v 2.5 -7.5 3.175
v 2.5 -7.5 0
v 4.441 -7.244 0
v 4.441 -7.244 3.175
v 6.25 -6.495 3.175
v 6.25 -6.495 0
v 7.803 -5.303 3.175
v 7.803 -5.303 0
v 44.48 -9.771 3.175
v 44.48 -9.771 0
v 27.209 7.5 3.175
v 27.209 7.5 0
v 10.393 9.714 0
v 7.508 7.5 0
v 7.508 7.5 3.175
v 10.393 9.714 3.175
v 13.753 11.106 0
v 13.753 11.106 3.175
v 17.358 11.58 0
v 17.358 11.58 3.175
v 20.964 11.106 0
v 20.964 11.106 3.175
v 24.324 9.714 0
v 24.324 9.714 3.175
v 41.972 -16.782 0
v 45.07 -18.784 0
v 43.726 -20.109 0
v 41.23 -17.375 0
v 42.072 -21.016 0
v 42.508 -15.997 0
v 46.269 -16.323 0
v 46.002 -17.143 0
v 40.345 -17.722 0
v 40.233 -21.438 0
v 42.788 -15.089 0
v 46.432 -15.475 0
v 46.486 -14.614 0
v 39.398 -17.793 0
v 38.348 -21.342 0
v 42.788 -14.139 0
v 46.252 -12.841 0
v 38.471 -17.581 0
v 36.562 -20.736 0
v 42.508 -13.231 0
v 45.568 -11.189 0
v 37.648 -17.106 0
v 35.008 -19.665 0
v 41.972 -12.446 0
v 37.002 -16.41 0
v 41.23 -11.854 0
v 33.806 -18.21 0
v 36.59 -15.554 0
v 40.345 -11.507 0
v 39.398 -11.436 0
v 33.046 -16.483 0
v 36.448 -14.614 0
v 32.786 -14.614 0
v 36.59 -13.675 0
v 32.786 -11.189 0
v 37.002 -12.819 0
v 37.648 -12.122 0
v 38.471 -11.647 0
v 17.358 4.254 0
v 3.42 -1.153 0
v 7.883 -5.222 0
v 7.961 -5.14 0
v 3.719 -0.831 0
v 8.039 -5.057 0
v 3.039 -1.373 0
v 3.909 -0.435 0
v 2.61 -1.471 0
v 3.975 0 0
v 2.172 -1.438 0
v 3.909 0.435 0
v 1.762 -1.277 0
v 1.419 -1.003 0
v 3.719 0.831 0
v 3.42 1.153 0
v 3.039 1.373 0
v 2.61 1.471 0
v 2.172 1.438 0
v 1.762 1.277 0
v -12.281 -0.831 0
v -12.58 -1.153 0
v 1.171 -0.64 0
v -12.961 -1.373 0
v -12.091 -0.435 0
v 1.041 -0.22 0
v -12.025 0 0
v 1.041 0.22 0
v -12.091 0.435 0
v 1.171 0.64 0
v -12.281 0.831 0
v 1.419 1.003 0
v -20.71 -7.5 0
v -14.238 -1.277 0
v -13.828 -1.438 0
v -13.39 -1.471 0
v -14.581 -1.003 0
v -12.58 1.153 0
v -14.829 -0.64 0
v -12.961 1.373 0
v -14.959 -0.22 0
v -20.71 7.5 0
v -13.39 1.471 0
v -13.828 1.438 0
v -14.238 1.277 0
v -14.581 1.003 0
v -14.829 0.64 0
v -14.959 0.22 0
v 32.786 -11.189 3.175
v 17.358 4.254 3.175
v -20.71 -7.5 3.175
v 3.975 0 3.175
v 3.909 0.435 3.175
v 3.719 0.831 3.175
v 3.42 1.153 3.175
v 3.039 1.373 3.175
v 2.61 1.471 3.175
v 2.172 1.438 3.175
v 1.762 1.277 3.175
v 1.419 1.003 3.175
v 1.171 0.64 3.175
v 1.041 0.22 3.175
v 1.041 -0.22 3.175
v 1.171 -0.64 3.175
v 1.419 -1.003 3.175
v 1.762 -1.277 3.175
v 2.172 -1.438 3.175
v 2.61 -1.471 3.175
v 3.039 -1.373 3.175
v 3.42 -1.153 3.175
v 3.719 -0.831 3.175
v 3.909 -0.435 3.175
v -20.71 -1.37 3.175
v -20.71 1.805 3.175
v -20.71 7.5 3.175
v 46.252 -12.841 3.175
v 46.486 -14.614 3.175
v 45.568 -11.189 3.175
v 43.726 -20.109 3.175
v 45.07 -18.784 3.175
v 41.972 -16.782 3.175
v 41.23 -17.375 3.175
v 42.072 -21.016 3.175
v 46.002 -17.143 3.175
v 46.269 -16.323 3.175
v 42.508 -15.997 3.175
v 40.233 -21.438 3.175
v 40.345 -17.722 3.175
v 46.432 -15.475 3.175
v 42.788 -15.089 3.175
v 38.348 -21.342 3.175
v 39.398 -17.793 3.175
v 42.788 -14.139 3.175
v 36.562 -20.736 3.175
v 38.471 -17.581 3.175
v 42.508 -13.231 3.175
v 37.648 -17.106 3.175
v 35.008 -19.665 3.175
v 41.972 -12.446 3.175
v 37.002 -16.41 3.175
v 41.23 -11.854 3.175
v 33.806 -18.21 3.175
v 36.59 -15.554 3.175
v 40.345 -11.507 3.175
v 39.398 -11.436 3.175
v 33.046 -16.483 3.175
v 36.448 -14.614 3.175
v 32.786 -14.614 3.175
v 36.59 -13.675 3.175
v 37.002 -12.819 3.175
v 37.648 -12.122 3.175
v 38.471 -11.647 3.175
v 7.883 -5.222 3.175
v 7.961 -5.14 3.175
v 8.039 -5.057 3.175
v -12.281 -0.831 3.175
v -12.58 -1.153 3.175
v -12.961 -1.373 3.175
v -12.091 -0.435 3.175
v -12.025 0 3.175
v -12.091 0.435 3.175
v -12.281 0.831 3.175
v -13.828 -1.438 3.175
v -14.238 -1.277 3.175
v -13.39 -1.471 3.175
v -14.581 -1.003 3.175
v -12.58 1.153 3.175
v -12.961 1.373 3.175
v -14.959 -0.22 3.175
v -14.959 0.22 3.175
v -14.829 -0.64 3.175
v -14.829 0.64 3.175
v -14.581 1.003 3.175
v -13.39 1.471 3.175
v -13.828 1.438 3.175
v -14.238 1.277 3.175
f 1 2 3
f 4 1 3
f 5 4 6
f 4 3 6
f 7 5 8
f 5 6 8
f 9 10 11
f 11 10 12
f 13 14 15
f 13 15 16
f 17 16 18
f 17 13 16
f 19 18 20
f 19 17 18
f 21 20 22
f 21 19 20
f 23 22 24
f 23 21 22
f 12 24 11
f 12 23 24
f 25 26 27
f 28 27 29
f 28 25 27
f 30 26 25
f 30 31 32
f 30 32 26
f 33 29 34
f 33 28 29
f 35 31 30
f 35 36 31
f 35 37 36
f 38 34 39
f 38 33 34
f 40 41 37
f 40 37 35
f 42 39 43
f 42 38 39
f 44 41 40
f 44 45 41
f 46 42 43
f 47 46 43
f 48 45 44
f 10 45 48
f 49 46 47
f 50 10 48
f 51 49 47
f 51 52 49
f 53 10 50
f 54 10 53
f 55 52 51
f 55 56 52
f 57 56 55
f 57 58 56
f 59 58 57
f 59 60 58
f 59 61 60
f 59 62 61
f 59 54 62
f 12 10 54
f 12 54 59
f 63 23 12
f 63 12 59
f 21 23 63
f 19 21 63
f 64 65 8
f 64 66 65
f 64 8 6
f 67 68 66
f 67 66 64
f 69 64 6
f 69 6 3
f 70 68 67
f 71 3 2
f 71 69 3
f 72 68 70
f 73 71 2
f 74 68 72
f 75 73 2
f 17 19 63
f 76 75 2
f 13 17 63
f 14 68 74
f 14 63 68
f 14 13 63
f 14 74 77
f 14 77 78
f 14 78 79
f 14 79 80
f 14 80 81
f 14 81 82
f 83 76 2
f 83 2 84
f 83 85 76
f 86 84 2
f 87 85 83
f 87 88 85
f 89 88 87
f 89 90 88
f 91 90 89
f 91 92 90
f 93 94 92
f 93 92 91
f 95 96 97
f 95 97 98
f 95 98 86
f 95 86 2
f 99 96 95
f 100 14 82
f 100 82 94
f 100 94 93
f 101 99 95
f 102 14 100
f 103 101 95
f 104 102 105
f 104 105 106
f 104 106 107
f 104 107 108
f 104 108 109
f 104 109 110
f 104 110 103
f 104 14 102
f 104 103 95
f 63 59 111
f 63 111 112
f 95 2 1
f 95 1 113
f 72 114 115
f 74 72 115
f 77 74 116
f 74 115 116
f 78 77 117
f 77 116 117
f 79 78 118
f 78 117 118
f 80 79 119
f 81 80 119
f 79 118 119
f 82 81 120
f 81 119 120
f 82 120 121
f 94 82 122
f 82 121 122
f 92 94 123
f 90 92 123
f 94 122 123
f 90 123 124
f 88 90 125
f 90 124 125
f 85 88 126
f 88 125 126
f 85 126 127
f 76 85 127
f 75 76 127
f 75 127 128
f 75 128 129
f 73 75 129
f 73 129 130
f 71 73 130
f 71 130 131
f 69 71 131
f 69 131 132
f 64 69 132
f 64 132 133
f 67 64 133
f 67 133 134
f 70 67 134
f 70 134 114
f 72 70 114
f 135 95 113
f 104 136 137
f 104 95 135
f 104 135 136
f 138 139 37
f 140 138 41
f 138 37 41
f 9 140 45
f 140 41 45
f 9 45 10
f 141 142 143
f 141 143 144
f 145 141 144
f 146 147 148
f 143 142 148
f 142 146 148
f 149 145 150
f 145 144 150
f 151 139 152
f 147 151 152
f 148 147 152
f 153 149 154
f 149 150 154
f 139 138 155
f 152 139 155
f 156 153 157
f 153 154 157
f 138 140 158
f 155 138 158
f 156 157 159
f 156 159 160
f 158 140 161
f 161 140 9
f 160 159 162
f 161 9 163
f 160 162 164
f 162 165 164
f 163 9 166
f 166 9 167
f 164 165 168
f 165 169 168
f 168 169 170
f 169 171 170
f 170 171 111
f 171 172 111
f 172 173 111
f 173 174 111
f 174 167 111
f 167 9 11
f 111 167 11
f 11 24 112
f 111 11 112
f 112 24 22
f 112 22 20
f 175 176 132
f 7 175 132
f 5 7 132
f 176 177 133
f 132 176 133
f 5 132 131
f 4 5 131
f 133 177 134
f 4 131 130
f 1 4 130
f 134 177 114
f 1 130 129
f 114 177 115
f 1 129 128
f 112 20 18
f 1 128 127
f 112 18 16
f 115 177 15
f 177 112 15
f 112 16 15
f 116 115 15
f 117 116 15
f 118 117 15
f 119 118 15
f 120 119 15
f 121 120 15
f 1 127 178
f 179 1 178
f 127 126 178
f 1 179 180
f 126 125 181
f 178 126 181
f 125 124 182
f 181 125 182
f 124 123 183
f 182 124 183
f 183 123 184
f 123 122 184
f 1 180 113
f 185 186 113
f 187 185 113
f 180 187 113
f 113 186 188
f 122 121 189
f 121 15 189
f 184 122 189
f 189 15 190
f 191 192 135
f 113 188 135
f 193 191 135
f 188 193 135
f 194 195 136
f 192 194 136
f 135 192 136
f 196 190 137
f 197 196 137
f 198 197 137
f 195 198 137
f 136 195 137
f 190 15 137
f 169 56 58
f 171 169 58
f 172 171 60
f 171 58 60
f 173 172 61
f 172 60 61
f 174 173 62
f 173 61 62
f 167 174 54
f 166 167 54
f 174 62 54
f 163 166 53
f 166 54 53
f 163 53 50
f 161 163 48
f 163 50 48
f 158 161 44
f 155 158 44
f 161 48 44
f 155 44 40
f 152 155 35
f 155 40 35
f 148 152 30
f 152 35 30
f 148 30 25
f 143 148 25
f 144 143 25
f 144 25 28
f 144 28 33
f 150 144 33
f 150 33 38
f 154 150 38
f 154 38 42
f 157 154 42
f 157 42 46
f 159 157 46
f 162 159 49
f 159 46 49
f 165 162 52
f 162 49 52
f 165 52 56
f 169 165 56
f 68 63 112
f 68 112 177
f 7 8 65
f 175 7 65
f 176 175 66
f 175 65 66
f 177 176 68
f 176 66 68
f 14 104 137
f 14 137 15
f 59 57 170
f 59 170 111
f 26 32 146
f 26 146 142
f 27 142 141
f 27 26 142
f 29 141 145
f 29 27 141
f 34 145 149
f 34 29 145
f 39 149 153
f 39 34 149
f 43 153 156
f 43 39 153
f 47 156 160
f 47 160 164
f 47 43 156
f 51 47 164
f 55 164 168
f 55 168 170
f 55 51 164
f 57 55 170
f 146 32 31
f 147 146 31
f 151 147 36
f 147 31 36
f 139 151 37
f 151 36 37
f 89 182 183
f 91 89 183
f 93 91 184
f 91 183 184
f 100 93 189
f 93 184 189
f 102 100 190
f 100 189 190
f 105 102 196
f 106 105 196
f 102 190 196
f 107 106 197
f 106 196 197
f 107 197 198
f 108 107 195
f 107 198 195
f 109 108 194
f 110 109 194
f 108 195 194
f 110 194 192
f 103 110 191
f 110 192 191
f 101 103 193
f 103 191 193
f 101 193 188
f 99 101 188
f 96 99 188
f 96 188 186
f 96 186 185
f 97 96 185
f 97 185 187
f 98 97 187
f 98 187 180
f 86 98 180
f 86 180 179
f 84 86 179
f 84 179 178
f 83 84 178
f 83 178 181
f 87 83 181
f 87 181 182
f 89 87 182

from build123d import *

# Parameters (mm, degrees)
SKETCH1_R            = 3.175
SKETCH1_R_2          = 4.8
BOSS_EXTRUDE1_DEPTH  = 3.175
SKETCH2_W            = 15
SKETCH2_H            = 3.175
CUT_EXTRUDE1_DEPTH   = 46.731068487
CUT_EXTRUDE2_START   = -10
CUT_EXTRUDE2_DEPTH   = 10
SKETCH4_W            = 11.581741037
SKETCH4_H            = 5.573186054
BOSS_EXTRUDE2_DEPTH  = 3.175
SKETCH5_R            = 1.475
CUT_EXTRUDE3_DEPTH   = 16
SKETCH6_W            = 21.273258962
SKETCH6_H            = 7.408259511
BOSS_EXTRUDE4_DEPTH  = 3.175
SKETCH12_R           = 4.8
CUT_EXTRUDE5_DEPTH   = 10
SKETCH15_R           = 4.85
BOSS_EXTRUDE10_DEPTH = 3.175
BOSS_EXTRUDE11_DEPTH = 3.175
BOSS_EXTRUDE12_DEPTH = 3.175
CUT_EXTRUDE6_DEPTH   = 10
CUT_EXTRUDE7_DEPTH   = 10
BOSS_EXTRUDE13_DEPTH = 3.175
BOSS_EXTRUDE14_DEPTH = 3.175
CUT_EXTRUDE8_DEPTH   = 10
SKETCH8_W            = 10
SKETCH8_H            = 3.175
CUT_EXTRUDE4_DEPTH   = 10
BOSS_EXTRUDE15_DEPTH = 3.175
CUT_EXTRUDE10_DEPTH  = 10
CUT_EXTRUDE11_DEPTH  = 10
BOSS_EXTRUDE16_DEPTH = 3.175
CUT_EXTRUDE12_DEPTH  = 3.175
BOSS_EXTRUDE18_DEPTH = 3.175
CUT_EXTRUDE13_DEPTH  = 3.175
BOSS_EXTRUDE19_DEPTH = 3.175
SKETCH32_R           = 6.716159248
SKETCH32_R_2         = 3.1875
BOSS_EXTRUDE20_DEPTH = 3.175


with BuildPart() as part:
    # Sketch1 → Boss-Extrude1 (new body)
    with BuildSketch(Plane.XY):
        with BuildLine():
            Line((-37.5, 7.5), (37.5, 7.5))
            ThreePointArc((37.5, 7.5), (45, 0), (37.5, -7.5))
            Line((37.5, -7.5), (-37.5, -7.5))
            ThreePointArc((-37.5, -7.5), (-45, 0), (-37.5, 7.5))
        make_face()
        with Locations((-37.5, 0)):
            Circle(SKETCH1_R, mode=Mode.SUBTRACT)
        with Locations((37.5, 0)):
            Circle(SKETCH1_R_2, mode=Mode.SUBTRACT)
    extrude(amount=BOSS_EXTRUDE1_DEPTH)

    # Sketch2 → Cut-Extrude1 (cut, through all)
    with BuildSketch(Plane.XY.offset(3.175)):
        with Locations((-17.5, 0.21703664)):
            Rectangle(SKETCH2_W, SKETCH2_H)
        with Locations((17.5, 0.853492694)):
            Rectangle(SKETCH2_W, SKETCH2_H)
    extrude(amount=-CUT_EXTRUDE1_DEPTH, mode=Mode.SUBTRACT)

    # Sketch3 → Cut-Extrude2 (cut)
    with BuildSketch(Plane.XY.offset(3.175).offset(CUT_EXTRUDE2_START)):
        with BuildLine():
            Line((-56.505330914, 0), (-45, 0))
            ThreePointArc((-45, 0), (-42.803300859, 5.303300859), (-37.5, 7.5))
            Line((-37.5, 7.5), (-20.71, 7.5))
            Line((-20.71, 7.5), (-20.71, 17.128469338))
            Line((-20.71, 17.128469338), (-56.505330914, 17.128469338))
            Line((-56.505330914, 17.128469338), (-56.505330914, 0))
        make_face()
        with BuildLine():
            ThreePointArc((-37.5, -7.5), (-42.803300859, -5.303300859), (-45, 0))
            Line((-45, 0), (-56.505330914, 0))
            Line((-56.505330914, 0), (-56.505330914, -10.2398458))
            Line((-56.505330914, -10.2398458), (-20.71, -10.2398458))
            Line((-20.71, -10.2398458), (-20.71, -7.5))
            Line((-20.71, -7.5), (-37.5, -7.5))
        make_face()
        with BuildLine():
            ThreePointArc((-40.675, 0), (-37.5, 3.175), (-34.325, 0))
            Line((-34.325, 0), (-25, 0))
            Line((-25, 0), (-25, 1.80453664))
            Line((-25, 1.80453664), (-20.71, 1.80453664))
            Line((-20.71, 1.80453664), (-20.71, 7.5))
            Line((-20.71, 7.5), (-37.5, 7.5))
            ThreePointArc((-37.5, 7.5), (-42.803300859, 5.303300859), (-45, 0))
            Line((-45, 0), (-40.675, 0))
        make_face()
        with BuildLine():
            Line((-25, 0), (-34.325, 0))
            ThreePointArc((-34.325, 0), (-37.5, -3.175), (-40.675, 0))
            Line((-40.675, 0), (-45, 0))
            ThreePointArc((-45, 0), (-42.803300859, -5.303300859), (-37.5, -7.5))
            Line((-37.5, -7.5), (-20.71, -7.5))
            Line((-20.71, -7.5), (-20.71, -1.37046336))
            Line((-20.71, -1.37046336), (-25, -1.37046336))
            Line((-25, -1.37046336), (-25, 0))
        make_face()
    extrude(amount=CUT_EXTRUDE2_DEPTH, mode=Mode.SUBTRACT)

    # Sketch4 → Boss-Extrude2 (add)
    with BuildSketch(Plane.XY.offset(3.175)):
        with Locations((-14.919129482, -0.129821549)):
            Rectangle(SKETCH4_W, SKETCH4_H)
    extrude(amount=-BOSS_EXTRUDE2_DEPTH)

    # Sketch5 → Cut-Extrude3 (cut)
    with BuildSketch(Plane.XY.offset(3.175)):
        with Locations((-13.5, 0)):
            Circle(SKETCH5_R)
        with Locations((2.5, 0)):
            Circle(SKETCH5_R)
    extrude(amount=-CUT_EXTRUDE3_DEPTH, mode=Mode.SUBTRACT)

    # Sketch6 → Boss-Extrude4 (add)
    with BuildSketch(Plane.XY.offset(3.175)):
        with Locations((18.907585517, 0.667769414)):
            Rectangle(SKETCH6_W, SKETCH6_H)
    extrude(amount=-BOSS_EXTRUDE4_DEPTH)

    # Sketch12 → Cut-Extrude5 (cut)
    # profile 1 of 2: a face of its own
    with BuildSketch(Plane(origin=(0, 0, 0), x_dir=(-1, 0, 0), z_dir=(0, 0, -1))):
        with BuildLine():
            Line((-2.5, 7.5), (-37.5, 7.5))
            ThreePointArc((-37.5, 7.5), (-32.196699141, 5.303300859), (-30, 0))
            ThreePointArc((-30, 0), (-32.196699141, -5.303300859), (-37.5, -7.5))
            Line((-37.5, -7.5), (-2.5, -7.5))
            ThreePointArc((-2.5, -7.5), (-10, 0), (-2.5, 7.5))
        make_face()
    # profile 2 of 2: a face of its own
    with BuildSketch(Plane(origin=(0, 0, 0), x_dir=(-1, 0, 0), z_dir=(0, 0, -1))):
        with BuildLine():
            ThreePointArc((-30, 0), (-32.196699141, 5.303300859), (-37.5, 7.5))
            ThreePointArc((-37.5, 7.5), (-45, 0), (-37.5, -7.5))
            ThreePointArc((-37.5, -7.5), (-32.196699141, -5.303300859), (-30, 0))
        make_face()
        with Locations((-37.5, 0)):
            Circle(SKETCH12_R, mode=Mode.SUBTRACT)
    extrude(amount=-CUT_EXTRUDE5_DEPTH, mode=Mode.SUBTRACT)

    # Sketch15 → Boss-Extrude10 (add)
    with BuildSketch(Plane(origin=(0, 0, 0), x_dir=(-1, 0, 0), z_dir=(0, 0, -1))):
        with BuildLine():
            ThreePointArc((-46.001929081, -17.143138466), (-35.871769222, -20.337345998), (-34.79216247, -9.770532392))
            Line((-34.79216247, -9.770532392), (-34.739826286, -9.718196208))
            ThreePointArc((-34.739826286, -9.718196208), (-27.229011247, 7.510815039), (-10, 0))
            ThreePointArc((-10, 0), (-7.803300859, 5.303300859), (-2.5, 7.5))
            ThreePointArc((-2.5, 7.5), (-36.707777113, 17.168137065), (-46.001929081, -17.143138466))
        make_face()
        with Locations((-39.635843921, -14.614213843)):
            Circle(SKETCH15_R, mode=Mode.SUBTRACT)
    extrude(amount=-BOSS_EXTRUDE10_DEPTH)

    # Sketch16 → Boss-Extrude11 (add)
    with BuildSketch(Plane(origin=(0, 0, 0), x_dir=(-1, 0, 0), z_dir=(0, 0, -1))):
        with BuildLine():
            Line((-21.509690563, 8.403088845), (-7.803300859, -5.303300859))
            ThreePointArc((-7.803300859, -5.303300859), (-9.429096494, -2.870125743), (-10, 0))
            ThreePointArc((-10, 0), (-14.533325981, 5.874656467), (-21.509690563, 8.403088845))
        make_face()
    extrude(amount=-BOSS_EXTRUDE11_DEPTH)

    # Sketch17 → Boss-Extrude12 (add)
    with BuildSketch(Plane(origin=(0, 0, 0), x_dir=(-1, 0, 0), z_dir=(0, 0, -1))):
        with BuildLine():
            Line((-20.755882022, 9.519320843), (-23.45404322, 8.658356332))
            ThreePointArc((-23.45404322, 8.658356332), (-23.129421083, 8.546024811), (-22.808422976, 8.423721426))
            ThreePointArc((-22.808422976, 8.423721426), (-22.158804554, 8.429280981), (-21.509690563, 8.403088845))
            Line((-21.509690563, 8.403088845), (-19.064115898, 5.95751418))
            Line((-19.064115898, 5.95751418), (-20.755882022, 9.519320843))
        make_face()
        with BuildLine():
            ThreePointArc((-21.509690563, 8.403088845), (-22.158804554, 8.429280981), (-22.808422976, 8.423721426))
            ThreePointArc((-22.808422976, 8.423721426), (-20.81070119, 7.38126118), (-19.064115898, 5.95751418))
            Line((-19.064115898, 5.95751418), (-21.509690563, 8.403088845))
        make_face()
        with BuildLine():
            ThreePointArc((-23.45404322, 8.658356332), (-36.40040662, 3.921172604), (-34.79216247, -9.770532392))
            Line((-34.79216247, -9.770532392), (-34.739826286, -9.718196208))
            ThreePointArc((-34.739826286, -9.718196208), (-33.473796187, 2.443597762), (-22.808422976, 8.423721426))
            ThreePointArc((-22.808422976, 8.423721426), (-23.129421083, 8.546024811), (-23.45404322, 8.658356332))
        make_face()
        with BuildLine():
            ThreePointArc((-22.808422976, 8.423721426), (-33.473796187, 2.443597762), (-34.739826286, -9.718196208))
            Line((-34.739826286, -9.718196208), (-32.925869648, -7.90423957))
            Line((-32.925869648, -7.90423957), (-19.064115898, 5.95751418))
            ThreePointArc((-19.064115898, 5.95751418), (-20.81070119, 7.38126118), (-22.808422976, 8.423721426))
        make_face()
    extrude(amount=-BOSS_EXTRUDE12_DEPTH)

    # Sketch18 → Cut-Extrude6 (cut)
    with BuildSketch(Plane(origin=(0, 0, 0), x_dir=(-1, 0, 0), z_dir=(0, 0, -1))):
        Polygon((-49.385473713, -4.584123483), (-24.385473713, 20.415876517), (-30.56765092, 24.378047278), (-55.403941692, 2.136458495), align=None)
    extrude(amount=-CUT_EXTRUDE6_DEPTH, mode=Mode.SUBTRACT)

    # Sketch19 → Cut-Extrude7 (cut)
    with BuildSketch(Plane(origin=(0, 0, 0), x_dir=(-1, 0, 0), z_dir=(0, 0, -1))):
        with BuildLine():
            ThreePointArc((-46.001929081, -17.143138466), (-46.344312222, -13.228951032), (-44.479525373, -9.770532392))
            Line((-44.479525373, -9.770532392), (-15.809929944, 18.899063036))
            ThreePointArc((-15.809929944, 18.899063036), (-20.031146151, 20.033752776), (-24.385473713, 20.415876517))
            Line((-24.385473713, 20.415876517), (-49.385473713, -4.584123483))
            ThreePointArc((-49.385473713, -4.584123483), (-48.524771385, -11.08753089), (-46.001929081, -17.143138466))
        make_face()
    extrude(amount=-CUT_EXTRUDE7_DEPTH, mode=Mode.SUBTRACT)

    # Sketch20 → Boss-Extrude13 (add)
    with BuildSketch(Plane(origin=(0, 0, 0), x_dir=(-1, 0, 0), z_dir=(0, 0, -1))):
        with BuildLine():
            Line((-32.785843921, -14.614213843), (-32.785843921, -7.764213843))
            ThreePointArc((-32.785843921, -7.764213843), (-34.411726772, -8.208442505), (-35.585840533, -9.417694765))
            Line((-35.585840533, -9.417694765), (-32.785843921, -14.614213843))
        make_face()
        Polygon((-46.485843921, -14.614213843), (-46.485843921, -7.764213843), (-15.809929944, 18.899063036), align=None)
    extrude(amount=-BOSS_EXTRUDE13_DEPTH)

    # Sketch21 → Boss-Extrude14 (add)
    with BuildSketch(Plane(origin=(0, 0, 0), x_dir=(-1, 0, 0), z_dir=(0, 0, -1))):
        with BuildLine():
            Line((-15.809929944, 18.899063036), (-3.494683458, 5.188322232))
            Line((-3.494683458, 5.188322232), (20.71, 7.5))
            ThreePointArc((20.71, 7.5), (3.510589711, 16.597300494), (-15.809929944, 18.899063036))
        make_face()
    extrude(amount=-BOSS_EXTRUDE14_DEPTH)

    # Sketch22 → Cut-Extrude8 (cut)
    with BuildSketch(Plane(origin=(0, 0, 0), x_dir=(-1, 0, 0), z_dir=(0, 0, -1))):
        with BuildLine():
            ThreePointArc((-7.803300859, -5.303300859), (-9.665367717, 2.215289028), (-3.884823194, 7.371042309))
            Line((-3.884823194, 7.371042309), (-19.064115898, 5.95751418))
            Line((-19.064115898, 5.95751418), (-7.803300859, -5.303300859))
        make_face()
    extrude(amount=-CUT_EXTRUDE8_DEPTH, mode=Mode.SUBTRACT)

    # Sketch8 → Cut-Extrude4 (cut)
    with BuildSketch(Plane.XY.offset(3.175)):
        with Locations((19, 0)):
            Rectangle(SKETCH8_W, SKETCH8_H)
    extrude(amount=-CUT_EXTRUDE4_DEPTH, mode=Mode.SUBTRACT)

    # Sketch24 → Boss-Extrude15 (add)
    with BuildSketch(Plane(origin=(0, 0, 0), x_dir=(-1, 0, 0), z_dir=(0, 0, -1))):
        Polygon((-32.785843921, -7.764213843), (-19.064115898, 5.95751418), (-25.92497991, 1.835763138), align=None)
    extrude(amount=-BOSS_EXTRUDE15_DEPTH)

    # Sketch25 → Cut-Extrude10 (cut)
    with BuildSketch(Plane(origin=(0, 0, 0), x_dir=(-1, 0, 0), z_dir=(0, 0, -1))):
        with BuildLine():
            ThreePointArc((-46.485843921, -14.614213843), (-45.964418719, -11.992832332), (-44.479525373, -9.770532392))
            Line((-44.479525373, -9.770532392), (-15.809929944, 18.899063036))
            Line((-15.809929944, 18.899063036), (-46.485843921, -7.764213843))
            Line((-46.485843921, -7.764213843), (-46.485843921, -14.614213843))
        make_face()
    extrude(amount=-CUT_EXTRUDE10_DEPTH, mode=Mode.SUBTRACT)

    # Sketch26 → Cut-Extrude11 (cut)
    with BuildSketch(Plane(origin=(0, 0, 0), x_dir=(-1, 0, 0), z_dir=(0, 0, -1))):
        with BuildLine():
            Line((-15.809929944, 18.899063036), (-23.907797349, 10.801195631))
            ThreePointArc((-23.907797349, 10.801195631), (-1.26089762, 15.105031891), (20.545662044, 7.629804166))
            ThreePointArc((20.545662044, 7.629804166), (3.410605692, 16.628400783), (-15.809929944, 18.899063036))
        make_face()
        with BuildLine():
            Line((-24.462923893, 21.153371093), (-23.907797349, 10.801195631))
            Line((-23.907797349, 10.801195631), (-15.809929944, 18.899063036))
            ThreePointArc((-15.809929944, 18.899063036), (3.410605692, 16.628400783), (20.545662044, 7.629804166))
            Line((20.545662044, 7.629804166), (12.510465987, 32.510755223))
            Line((12.510465987, 32.510755223), (-24.462923893, 21.153371093))
        make_face()
    extrude(amount=-CUT_EXTRUDE11_DEPTH, mode=Mode.SUBTRACT)

    # Sketch27 → Boss-Extrude16 (add)
    with BuildSketch(Plane(origin=(0, 0, 0), x_dir=(-1, 0, 0), z_dir=(0, 0, -1))):
        with BuildLine():
            ThreePointArc((-8.038695105, -5.056961196), (-9.359104011, -3.033593935), (-9.967690986, -0.69540732))
            ThreePointArc((-9.967690986, -0.69540732), (-8.488209602, 4.515677775), (-3.884823194, 7.371042309))
            Line((-3.884823194, 7.371042309), (-19.064115898, 5.95751418))
            Line((-19.064115898, 5.95751418), (-8.038695105, -5.056961196))
        make_face()
    extrude(amount=-BOSS_EXTRUDE16_DEPTH)

    # Sketch28 → Cut-Extrude12 (cut)
    with BuildSketch(Plane(origin=(0, 0, 0), x_dir=(-1, 0, 0), z_dir=(0, 0, -1))):
        Polygon((20.71, 7.5), (-23.907797349, 10.801195631), (-10.730396659, 19.898602306), (15.158212603, 17.043524683), align=None)
    extrude(amount=-CUT_EXTRUDE12_DEPTH, mode=Mode.SUBTRACT)

    # Sketch29 → Boss-Extrude18 (add)
    with BuildSketch(Plane(origin=(0, 0, 0), x_dir=(-1, 0, 0), z_dir=(0, 0, -1))):
        Polygon((-19.064115898, 5.95751418), (-32.785843921, -7.764213843), (-32.785843921, -11.189213843), (-17.358434587, 4.253526174), align=None)
    extrude(amount=-BOSS_EXTRUDE18_DEPTH)

    # Sketch30 → Cut-Extrude13 (cut)
    with BuildSketch(Plane(origin=(0, 0, 0), x_dir=(-1, 0, 0), z_dir=(0, 0, -1))):
        Polygon((20.71, 7.5), (-29.726171722, 7.5), (-24.020649075, 17.421001934), align=None)
    extrude(amount=-CUT_EXTRUDE13_DEPTH, mode=Mode.SUBTRACT)

    # Sketch31 → Boss-Extrude19 (add)
    with BuildSketch(Plane(origin=(0, 0, 0), x_dir=(-1, 0, 0), z_dir=(0, 0, -1))):
        with BuildLine():
            Line((-27.20899298, 7.5), (-7.507876194, 7.5))
            ThreePointArc((-7.507876194, 7.5), (-17.358434587, 11.580234883), (-27.20899298, 7.5))
        make_face()
    extrude(amount=-BOSS_EXTRUDE19_DEPTH)

    # Sketch32 → Boss-Extrude20 (add)
    with BuildSketch(Plane(origin=(0, 0, 0), x_dir=(-1, 0, 0), z_dir=(0, 0, -1))):
        with Locations((-39.635843921, -14.614213843)):
            Circle(SKETCH32_R)
        with Locations((-39.635843921, -14.614213843)):
            Circle(SKETCH32_R_2, mode=Mode.SUBTRACT)
    extrude(amount=-BOSS_EXTRUDE20_DEPTH)


solid = part.part
